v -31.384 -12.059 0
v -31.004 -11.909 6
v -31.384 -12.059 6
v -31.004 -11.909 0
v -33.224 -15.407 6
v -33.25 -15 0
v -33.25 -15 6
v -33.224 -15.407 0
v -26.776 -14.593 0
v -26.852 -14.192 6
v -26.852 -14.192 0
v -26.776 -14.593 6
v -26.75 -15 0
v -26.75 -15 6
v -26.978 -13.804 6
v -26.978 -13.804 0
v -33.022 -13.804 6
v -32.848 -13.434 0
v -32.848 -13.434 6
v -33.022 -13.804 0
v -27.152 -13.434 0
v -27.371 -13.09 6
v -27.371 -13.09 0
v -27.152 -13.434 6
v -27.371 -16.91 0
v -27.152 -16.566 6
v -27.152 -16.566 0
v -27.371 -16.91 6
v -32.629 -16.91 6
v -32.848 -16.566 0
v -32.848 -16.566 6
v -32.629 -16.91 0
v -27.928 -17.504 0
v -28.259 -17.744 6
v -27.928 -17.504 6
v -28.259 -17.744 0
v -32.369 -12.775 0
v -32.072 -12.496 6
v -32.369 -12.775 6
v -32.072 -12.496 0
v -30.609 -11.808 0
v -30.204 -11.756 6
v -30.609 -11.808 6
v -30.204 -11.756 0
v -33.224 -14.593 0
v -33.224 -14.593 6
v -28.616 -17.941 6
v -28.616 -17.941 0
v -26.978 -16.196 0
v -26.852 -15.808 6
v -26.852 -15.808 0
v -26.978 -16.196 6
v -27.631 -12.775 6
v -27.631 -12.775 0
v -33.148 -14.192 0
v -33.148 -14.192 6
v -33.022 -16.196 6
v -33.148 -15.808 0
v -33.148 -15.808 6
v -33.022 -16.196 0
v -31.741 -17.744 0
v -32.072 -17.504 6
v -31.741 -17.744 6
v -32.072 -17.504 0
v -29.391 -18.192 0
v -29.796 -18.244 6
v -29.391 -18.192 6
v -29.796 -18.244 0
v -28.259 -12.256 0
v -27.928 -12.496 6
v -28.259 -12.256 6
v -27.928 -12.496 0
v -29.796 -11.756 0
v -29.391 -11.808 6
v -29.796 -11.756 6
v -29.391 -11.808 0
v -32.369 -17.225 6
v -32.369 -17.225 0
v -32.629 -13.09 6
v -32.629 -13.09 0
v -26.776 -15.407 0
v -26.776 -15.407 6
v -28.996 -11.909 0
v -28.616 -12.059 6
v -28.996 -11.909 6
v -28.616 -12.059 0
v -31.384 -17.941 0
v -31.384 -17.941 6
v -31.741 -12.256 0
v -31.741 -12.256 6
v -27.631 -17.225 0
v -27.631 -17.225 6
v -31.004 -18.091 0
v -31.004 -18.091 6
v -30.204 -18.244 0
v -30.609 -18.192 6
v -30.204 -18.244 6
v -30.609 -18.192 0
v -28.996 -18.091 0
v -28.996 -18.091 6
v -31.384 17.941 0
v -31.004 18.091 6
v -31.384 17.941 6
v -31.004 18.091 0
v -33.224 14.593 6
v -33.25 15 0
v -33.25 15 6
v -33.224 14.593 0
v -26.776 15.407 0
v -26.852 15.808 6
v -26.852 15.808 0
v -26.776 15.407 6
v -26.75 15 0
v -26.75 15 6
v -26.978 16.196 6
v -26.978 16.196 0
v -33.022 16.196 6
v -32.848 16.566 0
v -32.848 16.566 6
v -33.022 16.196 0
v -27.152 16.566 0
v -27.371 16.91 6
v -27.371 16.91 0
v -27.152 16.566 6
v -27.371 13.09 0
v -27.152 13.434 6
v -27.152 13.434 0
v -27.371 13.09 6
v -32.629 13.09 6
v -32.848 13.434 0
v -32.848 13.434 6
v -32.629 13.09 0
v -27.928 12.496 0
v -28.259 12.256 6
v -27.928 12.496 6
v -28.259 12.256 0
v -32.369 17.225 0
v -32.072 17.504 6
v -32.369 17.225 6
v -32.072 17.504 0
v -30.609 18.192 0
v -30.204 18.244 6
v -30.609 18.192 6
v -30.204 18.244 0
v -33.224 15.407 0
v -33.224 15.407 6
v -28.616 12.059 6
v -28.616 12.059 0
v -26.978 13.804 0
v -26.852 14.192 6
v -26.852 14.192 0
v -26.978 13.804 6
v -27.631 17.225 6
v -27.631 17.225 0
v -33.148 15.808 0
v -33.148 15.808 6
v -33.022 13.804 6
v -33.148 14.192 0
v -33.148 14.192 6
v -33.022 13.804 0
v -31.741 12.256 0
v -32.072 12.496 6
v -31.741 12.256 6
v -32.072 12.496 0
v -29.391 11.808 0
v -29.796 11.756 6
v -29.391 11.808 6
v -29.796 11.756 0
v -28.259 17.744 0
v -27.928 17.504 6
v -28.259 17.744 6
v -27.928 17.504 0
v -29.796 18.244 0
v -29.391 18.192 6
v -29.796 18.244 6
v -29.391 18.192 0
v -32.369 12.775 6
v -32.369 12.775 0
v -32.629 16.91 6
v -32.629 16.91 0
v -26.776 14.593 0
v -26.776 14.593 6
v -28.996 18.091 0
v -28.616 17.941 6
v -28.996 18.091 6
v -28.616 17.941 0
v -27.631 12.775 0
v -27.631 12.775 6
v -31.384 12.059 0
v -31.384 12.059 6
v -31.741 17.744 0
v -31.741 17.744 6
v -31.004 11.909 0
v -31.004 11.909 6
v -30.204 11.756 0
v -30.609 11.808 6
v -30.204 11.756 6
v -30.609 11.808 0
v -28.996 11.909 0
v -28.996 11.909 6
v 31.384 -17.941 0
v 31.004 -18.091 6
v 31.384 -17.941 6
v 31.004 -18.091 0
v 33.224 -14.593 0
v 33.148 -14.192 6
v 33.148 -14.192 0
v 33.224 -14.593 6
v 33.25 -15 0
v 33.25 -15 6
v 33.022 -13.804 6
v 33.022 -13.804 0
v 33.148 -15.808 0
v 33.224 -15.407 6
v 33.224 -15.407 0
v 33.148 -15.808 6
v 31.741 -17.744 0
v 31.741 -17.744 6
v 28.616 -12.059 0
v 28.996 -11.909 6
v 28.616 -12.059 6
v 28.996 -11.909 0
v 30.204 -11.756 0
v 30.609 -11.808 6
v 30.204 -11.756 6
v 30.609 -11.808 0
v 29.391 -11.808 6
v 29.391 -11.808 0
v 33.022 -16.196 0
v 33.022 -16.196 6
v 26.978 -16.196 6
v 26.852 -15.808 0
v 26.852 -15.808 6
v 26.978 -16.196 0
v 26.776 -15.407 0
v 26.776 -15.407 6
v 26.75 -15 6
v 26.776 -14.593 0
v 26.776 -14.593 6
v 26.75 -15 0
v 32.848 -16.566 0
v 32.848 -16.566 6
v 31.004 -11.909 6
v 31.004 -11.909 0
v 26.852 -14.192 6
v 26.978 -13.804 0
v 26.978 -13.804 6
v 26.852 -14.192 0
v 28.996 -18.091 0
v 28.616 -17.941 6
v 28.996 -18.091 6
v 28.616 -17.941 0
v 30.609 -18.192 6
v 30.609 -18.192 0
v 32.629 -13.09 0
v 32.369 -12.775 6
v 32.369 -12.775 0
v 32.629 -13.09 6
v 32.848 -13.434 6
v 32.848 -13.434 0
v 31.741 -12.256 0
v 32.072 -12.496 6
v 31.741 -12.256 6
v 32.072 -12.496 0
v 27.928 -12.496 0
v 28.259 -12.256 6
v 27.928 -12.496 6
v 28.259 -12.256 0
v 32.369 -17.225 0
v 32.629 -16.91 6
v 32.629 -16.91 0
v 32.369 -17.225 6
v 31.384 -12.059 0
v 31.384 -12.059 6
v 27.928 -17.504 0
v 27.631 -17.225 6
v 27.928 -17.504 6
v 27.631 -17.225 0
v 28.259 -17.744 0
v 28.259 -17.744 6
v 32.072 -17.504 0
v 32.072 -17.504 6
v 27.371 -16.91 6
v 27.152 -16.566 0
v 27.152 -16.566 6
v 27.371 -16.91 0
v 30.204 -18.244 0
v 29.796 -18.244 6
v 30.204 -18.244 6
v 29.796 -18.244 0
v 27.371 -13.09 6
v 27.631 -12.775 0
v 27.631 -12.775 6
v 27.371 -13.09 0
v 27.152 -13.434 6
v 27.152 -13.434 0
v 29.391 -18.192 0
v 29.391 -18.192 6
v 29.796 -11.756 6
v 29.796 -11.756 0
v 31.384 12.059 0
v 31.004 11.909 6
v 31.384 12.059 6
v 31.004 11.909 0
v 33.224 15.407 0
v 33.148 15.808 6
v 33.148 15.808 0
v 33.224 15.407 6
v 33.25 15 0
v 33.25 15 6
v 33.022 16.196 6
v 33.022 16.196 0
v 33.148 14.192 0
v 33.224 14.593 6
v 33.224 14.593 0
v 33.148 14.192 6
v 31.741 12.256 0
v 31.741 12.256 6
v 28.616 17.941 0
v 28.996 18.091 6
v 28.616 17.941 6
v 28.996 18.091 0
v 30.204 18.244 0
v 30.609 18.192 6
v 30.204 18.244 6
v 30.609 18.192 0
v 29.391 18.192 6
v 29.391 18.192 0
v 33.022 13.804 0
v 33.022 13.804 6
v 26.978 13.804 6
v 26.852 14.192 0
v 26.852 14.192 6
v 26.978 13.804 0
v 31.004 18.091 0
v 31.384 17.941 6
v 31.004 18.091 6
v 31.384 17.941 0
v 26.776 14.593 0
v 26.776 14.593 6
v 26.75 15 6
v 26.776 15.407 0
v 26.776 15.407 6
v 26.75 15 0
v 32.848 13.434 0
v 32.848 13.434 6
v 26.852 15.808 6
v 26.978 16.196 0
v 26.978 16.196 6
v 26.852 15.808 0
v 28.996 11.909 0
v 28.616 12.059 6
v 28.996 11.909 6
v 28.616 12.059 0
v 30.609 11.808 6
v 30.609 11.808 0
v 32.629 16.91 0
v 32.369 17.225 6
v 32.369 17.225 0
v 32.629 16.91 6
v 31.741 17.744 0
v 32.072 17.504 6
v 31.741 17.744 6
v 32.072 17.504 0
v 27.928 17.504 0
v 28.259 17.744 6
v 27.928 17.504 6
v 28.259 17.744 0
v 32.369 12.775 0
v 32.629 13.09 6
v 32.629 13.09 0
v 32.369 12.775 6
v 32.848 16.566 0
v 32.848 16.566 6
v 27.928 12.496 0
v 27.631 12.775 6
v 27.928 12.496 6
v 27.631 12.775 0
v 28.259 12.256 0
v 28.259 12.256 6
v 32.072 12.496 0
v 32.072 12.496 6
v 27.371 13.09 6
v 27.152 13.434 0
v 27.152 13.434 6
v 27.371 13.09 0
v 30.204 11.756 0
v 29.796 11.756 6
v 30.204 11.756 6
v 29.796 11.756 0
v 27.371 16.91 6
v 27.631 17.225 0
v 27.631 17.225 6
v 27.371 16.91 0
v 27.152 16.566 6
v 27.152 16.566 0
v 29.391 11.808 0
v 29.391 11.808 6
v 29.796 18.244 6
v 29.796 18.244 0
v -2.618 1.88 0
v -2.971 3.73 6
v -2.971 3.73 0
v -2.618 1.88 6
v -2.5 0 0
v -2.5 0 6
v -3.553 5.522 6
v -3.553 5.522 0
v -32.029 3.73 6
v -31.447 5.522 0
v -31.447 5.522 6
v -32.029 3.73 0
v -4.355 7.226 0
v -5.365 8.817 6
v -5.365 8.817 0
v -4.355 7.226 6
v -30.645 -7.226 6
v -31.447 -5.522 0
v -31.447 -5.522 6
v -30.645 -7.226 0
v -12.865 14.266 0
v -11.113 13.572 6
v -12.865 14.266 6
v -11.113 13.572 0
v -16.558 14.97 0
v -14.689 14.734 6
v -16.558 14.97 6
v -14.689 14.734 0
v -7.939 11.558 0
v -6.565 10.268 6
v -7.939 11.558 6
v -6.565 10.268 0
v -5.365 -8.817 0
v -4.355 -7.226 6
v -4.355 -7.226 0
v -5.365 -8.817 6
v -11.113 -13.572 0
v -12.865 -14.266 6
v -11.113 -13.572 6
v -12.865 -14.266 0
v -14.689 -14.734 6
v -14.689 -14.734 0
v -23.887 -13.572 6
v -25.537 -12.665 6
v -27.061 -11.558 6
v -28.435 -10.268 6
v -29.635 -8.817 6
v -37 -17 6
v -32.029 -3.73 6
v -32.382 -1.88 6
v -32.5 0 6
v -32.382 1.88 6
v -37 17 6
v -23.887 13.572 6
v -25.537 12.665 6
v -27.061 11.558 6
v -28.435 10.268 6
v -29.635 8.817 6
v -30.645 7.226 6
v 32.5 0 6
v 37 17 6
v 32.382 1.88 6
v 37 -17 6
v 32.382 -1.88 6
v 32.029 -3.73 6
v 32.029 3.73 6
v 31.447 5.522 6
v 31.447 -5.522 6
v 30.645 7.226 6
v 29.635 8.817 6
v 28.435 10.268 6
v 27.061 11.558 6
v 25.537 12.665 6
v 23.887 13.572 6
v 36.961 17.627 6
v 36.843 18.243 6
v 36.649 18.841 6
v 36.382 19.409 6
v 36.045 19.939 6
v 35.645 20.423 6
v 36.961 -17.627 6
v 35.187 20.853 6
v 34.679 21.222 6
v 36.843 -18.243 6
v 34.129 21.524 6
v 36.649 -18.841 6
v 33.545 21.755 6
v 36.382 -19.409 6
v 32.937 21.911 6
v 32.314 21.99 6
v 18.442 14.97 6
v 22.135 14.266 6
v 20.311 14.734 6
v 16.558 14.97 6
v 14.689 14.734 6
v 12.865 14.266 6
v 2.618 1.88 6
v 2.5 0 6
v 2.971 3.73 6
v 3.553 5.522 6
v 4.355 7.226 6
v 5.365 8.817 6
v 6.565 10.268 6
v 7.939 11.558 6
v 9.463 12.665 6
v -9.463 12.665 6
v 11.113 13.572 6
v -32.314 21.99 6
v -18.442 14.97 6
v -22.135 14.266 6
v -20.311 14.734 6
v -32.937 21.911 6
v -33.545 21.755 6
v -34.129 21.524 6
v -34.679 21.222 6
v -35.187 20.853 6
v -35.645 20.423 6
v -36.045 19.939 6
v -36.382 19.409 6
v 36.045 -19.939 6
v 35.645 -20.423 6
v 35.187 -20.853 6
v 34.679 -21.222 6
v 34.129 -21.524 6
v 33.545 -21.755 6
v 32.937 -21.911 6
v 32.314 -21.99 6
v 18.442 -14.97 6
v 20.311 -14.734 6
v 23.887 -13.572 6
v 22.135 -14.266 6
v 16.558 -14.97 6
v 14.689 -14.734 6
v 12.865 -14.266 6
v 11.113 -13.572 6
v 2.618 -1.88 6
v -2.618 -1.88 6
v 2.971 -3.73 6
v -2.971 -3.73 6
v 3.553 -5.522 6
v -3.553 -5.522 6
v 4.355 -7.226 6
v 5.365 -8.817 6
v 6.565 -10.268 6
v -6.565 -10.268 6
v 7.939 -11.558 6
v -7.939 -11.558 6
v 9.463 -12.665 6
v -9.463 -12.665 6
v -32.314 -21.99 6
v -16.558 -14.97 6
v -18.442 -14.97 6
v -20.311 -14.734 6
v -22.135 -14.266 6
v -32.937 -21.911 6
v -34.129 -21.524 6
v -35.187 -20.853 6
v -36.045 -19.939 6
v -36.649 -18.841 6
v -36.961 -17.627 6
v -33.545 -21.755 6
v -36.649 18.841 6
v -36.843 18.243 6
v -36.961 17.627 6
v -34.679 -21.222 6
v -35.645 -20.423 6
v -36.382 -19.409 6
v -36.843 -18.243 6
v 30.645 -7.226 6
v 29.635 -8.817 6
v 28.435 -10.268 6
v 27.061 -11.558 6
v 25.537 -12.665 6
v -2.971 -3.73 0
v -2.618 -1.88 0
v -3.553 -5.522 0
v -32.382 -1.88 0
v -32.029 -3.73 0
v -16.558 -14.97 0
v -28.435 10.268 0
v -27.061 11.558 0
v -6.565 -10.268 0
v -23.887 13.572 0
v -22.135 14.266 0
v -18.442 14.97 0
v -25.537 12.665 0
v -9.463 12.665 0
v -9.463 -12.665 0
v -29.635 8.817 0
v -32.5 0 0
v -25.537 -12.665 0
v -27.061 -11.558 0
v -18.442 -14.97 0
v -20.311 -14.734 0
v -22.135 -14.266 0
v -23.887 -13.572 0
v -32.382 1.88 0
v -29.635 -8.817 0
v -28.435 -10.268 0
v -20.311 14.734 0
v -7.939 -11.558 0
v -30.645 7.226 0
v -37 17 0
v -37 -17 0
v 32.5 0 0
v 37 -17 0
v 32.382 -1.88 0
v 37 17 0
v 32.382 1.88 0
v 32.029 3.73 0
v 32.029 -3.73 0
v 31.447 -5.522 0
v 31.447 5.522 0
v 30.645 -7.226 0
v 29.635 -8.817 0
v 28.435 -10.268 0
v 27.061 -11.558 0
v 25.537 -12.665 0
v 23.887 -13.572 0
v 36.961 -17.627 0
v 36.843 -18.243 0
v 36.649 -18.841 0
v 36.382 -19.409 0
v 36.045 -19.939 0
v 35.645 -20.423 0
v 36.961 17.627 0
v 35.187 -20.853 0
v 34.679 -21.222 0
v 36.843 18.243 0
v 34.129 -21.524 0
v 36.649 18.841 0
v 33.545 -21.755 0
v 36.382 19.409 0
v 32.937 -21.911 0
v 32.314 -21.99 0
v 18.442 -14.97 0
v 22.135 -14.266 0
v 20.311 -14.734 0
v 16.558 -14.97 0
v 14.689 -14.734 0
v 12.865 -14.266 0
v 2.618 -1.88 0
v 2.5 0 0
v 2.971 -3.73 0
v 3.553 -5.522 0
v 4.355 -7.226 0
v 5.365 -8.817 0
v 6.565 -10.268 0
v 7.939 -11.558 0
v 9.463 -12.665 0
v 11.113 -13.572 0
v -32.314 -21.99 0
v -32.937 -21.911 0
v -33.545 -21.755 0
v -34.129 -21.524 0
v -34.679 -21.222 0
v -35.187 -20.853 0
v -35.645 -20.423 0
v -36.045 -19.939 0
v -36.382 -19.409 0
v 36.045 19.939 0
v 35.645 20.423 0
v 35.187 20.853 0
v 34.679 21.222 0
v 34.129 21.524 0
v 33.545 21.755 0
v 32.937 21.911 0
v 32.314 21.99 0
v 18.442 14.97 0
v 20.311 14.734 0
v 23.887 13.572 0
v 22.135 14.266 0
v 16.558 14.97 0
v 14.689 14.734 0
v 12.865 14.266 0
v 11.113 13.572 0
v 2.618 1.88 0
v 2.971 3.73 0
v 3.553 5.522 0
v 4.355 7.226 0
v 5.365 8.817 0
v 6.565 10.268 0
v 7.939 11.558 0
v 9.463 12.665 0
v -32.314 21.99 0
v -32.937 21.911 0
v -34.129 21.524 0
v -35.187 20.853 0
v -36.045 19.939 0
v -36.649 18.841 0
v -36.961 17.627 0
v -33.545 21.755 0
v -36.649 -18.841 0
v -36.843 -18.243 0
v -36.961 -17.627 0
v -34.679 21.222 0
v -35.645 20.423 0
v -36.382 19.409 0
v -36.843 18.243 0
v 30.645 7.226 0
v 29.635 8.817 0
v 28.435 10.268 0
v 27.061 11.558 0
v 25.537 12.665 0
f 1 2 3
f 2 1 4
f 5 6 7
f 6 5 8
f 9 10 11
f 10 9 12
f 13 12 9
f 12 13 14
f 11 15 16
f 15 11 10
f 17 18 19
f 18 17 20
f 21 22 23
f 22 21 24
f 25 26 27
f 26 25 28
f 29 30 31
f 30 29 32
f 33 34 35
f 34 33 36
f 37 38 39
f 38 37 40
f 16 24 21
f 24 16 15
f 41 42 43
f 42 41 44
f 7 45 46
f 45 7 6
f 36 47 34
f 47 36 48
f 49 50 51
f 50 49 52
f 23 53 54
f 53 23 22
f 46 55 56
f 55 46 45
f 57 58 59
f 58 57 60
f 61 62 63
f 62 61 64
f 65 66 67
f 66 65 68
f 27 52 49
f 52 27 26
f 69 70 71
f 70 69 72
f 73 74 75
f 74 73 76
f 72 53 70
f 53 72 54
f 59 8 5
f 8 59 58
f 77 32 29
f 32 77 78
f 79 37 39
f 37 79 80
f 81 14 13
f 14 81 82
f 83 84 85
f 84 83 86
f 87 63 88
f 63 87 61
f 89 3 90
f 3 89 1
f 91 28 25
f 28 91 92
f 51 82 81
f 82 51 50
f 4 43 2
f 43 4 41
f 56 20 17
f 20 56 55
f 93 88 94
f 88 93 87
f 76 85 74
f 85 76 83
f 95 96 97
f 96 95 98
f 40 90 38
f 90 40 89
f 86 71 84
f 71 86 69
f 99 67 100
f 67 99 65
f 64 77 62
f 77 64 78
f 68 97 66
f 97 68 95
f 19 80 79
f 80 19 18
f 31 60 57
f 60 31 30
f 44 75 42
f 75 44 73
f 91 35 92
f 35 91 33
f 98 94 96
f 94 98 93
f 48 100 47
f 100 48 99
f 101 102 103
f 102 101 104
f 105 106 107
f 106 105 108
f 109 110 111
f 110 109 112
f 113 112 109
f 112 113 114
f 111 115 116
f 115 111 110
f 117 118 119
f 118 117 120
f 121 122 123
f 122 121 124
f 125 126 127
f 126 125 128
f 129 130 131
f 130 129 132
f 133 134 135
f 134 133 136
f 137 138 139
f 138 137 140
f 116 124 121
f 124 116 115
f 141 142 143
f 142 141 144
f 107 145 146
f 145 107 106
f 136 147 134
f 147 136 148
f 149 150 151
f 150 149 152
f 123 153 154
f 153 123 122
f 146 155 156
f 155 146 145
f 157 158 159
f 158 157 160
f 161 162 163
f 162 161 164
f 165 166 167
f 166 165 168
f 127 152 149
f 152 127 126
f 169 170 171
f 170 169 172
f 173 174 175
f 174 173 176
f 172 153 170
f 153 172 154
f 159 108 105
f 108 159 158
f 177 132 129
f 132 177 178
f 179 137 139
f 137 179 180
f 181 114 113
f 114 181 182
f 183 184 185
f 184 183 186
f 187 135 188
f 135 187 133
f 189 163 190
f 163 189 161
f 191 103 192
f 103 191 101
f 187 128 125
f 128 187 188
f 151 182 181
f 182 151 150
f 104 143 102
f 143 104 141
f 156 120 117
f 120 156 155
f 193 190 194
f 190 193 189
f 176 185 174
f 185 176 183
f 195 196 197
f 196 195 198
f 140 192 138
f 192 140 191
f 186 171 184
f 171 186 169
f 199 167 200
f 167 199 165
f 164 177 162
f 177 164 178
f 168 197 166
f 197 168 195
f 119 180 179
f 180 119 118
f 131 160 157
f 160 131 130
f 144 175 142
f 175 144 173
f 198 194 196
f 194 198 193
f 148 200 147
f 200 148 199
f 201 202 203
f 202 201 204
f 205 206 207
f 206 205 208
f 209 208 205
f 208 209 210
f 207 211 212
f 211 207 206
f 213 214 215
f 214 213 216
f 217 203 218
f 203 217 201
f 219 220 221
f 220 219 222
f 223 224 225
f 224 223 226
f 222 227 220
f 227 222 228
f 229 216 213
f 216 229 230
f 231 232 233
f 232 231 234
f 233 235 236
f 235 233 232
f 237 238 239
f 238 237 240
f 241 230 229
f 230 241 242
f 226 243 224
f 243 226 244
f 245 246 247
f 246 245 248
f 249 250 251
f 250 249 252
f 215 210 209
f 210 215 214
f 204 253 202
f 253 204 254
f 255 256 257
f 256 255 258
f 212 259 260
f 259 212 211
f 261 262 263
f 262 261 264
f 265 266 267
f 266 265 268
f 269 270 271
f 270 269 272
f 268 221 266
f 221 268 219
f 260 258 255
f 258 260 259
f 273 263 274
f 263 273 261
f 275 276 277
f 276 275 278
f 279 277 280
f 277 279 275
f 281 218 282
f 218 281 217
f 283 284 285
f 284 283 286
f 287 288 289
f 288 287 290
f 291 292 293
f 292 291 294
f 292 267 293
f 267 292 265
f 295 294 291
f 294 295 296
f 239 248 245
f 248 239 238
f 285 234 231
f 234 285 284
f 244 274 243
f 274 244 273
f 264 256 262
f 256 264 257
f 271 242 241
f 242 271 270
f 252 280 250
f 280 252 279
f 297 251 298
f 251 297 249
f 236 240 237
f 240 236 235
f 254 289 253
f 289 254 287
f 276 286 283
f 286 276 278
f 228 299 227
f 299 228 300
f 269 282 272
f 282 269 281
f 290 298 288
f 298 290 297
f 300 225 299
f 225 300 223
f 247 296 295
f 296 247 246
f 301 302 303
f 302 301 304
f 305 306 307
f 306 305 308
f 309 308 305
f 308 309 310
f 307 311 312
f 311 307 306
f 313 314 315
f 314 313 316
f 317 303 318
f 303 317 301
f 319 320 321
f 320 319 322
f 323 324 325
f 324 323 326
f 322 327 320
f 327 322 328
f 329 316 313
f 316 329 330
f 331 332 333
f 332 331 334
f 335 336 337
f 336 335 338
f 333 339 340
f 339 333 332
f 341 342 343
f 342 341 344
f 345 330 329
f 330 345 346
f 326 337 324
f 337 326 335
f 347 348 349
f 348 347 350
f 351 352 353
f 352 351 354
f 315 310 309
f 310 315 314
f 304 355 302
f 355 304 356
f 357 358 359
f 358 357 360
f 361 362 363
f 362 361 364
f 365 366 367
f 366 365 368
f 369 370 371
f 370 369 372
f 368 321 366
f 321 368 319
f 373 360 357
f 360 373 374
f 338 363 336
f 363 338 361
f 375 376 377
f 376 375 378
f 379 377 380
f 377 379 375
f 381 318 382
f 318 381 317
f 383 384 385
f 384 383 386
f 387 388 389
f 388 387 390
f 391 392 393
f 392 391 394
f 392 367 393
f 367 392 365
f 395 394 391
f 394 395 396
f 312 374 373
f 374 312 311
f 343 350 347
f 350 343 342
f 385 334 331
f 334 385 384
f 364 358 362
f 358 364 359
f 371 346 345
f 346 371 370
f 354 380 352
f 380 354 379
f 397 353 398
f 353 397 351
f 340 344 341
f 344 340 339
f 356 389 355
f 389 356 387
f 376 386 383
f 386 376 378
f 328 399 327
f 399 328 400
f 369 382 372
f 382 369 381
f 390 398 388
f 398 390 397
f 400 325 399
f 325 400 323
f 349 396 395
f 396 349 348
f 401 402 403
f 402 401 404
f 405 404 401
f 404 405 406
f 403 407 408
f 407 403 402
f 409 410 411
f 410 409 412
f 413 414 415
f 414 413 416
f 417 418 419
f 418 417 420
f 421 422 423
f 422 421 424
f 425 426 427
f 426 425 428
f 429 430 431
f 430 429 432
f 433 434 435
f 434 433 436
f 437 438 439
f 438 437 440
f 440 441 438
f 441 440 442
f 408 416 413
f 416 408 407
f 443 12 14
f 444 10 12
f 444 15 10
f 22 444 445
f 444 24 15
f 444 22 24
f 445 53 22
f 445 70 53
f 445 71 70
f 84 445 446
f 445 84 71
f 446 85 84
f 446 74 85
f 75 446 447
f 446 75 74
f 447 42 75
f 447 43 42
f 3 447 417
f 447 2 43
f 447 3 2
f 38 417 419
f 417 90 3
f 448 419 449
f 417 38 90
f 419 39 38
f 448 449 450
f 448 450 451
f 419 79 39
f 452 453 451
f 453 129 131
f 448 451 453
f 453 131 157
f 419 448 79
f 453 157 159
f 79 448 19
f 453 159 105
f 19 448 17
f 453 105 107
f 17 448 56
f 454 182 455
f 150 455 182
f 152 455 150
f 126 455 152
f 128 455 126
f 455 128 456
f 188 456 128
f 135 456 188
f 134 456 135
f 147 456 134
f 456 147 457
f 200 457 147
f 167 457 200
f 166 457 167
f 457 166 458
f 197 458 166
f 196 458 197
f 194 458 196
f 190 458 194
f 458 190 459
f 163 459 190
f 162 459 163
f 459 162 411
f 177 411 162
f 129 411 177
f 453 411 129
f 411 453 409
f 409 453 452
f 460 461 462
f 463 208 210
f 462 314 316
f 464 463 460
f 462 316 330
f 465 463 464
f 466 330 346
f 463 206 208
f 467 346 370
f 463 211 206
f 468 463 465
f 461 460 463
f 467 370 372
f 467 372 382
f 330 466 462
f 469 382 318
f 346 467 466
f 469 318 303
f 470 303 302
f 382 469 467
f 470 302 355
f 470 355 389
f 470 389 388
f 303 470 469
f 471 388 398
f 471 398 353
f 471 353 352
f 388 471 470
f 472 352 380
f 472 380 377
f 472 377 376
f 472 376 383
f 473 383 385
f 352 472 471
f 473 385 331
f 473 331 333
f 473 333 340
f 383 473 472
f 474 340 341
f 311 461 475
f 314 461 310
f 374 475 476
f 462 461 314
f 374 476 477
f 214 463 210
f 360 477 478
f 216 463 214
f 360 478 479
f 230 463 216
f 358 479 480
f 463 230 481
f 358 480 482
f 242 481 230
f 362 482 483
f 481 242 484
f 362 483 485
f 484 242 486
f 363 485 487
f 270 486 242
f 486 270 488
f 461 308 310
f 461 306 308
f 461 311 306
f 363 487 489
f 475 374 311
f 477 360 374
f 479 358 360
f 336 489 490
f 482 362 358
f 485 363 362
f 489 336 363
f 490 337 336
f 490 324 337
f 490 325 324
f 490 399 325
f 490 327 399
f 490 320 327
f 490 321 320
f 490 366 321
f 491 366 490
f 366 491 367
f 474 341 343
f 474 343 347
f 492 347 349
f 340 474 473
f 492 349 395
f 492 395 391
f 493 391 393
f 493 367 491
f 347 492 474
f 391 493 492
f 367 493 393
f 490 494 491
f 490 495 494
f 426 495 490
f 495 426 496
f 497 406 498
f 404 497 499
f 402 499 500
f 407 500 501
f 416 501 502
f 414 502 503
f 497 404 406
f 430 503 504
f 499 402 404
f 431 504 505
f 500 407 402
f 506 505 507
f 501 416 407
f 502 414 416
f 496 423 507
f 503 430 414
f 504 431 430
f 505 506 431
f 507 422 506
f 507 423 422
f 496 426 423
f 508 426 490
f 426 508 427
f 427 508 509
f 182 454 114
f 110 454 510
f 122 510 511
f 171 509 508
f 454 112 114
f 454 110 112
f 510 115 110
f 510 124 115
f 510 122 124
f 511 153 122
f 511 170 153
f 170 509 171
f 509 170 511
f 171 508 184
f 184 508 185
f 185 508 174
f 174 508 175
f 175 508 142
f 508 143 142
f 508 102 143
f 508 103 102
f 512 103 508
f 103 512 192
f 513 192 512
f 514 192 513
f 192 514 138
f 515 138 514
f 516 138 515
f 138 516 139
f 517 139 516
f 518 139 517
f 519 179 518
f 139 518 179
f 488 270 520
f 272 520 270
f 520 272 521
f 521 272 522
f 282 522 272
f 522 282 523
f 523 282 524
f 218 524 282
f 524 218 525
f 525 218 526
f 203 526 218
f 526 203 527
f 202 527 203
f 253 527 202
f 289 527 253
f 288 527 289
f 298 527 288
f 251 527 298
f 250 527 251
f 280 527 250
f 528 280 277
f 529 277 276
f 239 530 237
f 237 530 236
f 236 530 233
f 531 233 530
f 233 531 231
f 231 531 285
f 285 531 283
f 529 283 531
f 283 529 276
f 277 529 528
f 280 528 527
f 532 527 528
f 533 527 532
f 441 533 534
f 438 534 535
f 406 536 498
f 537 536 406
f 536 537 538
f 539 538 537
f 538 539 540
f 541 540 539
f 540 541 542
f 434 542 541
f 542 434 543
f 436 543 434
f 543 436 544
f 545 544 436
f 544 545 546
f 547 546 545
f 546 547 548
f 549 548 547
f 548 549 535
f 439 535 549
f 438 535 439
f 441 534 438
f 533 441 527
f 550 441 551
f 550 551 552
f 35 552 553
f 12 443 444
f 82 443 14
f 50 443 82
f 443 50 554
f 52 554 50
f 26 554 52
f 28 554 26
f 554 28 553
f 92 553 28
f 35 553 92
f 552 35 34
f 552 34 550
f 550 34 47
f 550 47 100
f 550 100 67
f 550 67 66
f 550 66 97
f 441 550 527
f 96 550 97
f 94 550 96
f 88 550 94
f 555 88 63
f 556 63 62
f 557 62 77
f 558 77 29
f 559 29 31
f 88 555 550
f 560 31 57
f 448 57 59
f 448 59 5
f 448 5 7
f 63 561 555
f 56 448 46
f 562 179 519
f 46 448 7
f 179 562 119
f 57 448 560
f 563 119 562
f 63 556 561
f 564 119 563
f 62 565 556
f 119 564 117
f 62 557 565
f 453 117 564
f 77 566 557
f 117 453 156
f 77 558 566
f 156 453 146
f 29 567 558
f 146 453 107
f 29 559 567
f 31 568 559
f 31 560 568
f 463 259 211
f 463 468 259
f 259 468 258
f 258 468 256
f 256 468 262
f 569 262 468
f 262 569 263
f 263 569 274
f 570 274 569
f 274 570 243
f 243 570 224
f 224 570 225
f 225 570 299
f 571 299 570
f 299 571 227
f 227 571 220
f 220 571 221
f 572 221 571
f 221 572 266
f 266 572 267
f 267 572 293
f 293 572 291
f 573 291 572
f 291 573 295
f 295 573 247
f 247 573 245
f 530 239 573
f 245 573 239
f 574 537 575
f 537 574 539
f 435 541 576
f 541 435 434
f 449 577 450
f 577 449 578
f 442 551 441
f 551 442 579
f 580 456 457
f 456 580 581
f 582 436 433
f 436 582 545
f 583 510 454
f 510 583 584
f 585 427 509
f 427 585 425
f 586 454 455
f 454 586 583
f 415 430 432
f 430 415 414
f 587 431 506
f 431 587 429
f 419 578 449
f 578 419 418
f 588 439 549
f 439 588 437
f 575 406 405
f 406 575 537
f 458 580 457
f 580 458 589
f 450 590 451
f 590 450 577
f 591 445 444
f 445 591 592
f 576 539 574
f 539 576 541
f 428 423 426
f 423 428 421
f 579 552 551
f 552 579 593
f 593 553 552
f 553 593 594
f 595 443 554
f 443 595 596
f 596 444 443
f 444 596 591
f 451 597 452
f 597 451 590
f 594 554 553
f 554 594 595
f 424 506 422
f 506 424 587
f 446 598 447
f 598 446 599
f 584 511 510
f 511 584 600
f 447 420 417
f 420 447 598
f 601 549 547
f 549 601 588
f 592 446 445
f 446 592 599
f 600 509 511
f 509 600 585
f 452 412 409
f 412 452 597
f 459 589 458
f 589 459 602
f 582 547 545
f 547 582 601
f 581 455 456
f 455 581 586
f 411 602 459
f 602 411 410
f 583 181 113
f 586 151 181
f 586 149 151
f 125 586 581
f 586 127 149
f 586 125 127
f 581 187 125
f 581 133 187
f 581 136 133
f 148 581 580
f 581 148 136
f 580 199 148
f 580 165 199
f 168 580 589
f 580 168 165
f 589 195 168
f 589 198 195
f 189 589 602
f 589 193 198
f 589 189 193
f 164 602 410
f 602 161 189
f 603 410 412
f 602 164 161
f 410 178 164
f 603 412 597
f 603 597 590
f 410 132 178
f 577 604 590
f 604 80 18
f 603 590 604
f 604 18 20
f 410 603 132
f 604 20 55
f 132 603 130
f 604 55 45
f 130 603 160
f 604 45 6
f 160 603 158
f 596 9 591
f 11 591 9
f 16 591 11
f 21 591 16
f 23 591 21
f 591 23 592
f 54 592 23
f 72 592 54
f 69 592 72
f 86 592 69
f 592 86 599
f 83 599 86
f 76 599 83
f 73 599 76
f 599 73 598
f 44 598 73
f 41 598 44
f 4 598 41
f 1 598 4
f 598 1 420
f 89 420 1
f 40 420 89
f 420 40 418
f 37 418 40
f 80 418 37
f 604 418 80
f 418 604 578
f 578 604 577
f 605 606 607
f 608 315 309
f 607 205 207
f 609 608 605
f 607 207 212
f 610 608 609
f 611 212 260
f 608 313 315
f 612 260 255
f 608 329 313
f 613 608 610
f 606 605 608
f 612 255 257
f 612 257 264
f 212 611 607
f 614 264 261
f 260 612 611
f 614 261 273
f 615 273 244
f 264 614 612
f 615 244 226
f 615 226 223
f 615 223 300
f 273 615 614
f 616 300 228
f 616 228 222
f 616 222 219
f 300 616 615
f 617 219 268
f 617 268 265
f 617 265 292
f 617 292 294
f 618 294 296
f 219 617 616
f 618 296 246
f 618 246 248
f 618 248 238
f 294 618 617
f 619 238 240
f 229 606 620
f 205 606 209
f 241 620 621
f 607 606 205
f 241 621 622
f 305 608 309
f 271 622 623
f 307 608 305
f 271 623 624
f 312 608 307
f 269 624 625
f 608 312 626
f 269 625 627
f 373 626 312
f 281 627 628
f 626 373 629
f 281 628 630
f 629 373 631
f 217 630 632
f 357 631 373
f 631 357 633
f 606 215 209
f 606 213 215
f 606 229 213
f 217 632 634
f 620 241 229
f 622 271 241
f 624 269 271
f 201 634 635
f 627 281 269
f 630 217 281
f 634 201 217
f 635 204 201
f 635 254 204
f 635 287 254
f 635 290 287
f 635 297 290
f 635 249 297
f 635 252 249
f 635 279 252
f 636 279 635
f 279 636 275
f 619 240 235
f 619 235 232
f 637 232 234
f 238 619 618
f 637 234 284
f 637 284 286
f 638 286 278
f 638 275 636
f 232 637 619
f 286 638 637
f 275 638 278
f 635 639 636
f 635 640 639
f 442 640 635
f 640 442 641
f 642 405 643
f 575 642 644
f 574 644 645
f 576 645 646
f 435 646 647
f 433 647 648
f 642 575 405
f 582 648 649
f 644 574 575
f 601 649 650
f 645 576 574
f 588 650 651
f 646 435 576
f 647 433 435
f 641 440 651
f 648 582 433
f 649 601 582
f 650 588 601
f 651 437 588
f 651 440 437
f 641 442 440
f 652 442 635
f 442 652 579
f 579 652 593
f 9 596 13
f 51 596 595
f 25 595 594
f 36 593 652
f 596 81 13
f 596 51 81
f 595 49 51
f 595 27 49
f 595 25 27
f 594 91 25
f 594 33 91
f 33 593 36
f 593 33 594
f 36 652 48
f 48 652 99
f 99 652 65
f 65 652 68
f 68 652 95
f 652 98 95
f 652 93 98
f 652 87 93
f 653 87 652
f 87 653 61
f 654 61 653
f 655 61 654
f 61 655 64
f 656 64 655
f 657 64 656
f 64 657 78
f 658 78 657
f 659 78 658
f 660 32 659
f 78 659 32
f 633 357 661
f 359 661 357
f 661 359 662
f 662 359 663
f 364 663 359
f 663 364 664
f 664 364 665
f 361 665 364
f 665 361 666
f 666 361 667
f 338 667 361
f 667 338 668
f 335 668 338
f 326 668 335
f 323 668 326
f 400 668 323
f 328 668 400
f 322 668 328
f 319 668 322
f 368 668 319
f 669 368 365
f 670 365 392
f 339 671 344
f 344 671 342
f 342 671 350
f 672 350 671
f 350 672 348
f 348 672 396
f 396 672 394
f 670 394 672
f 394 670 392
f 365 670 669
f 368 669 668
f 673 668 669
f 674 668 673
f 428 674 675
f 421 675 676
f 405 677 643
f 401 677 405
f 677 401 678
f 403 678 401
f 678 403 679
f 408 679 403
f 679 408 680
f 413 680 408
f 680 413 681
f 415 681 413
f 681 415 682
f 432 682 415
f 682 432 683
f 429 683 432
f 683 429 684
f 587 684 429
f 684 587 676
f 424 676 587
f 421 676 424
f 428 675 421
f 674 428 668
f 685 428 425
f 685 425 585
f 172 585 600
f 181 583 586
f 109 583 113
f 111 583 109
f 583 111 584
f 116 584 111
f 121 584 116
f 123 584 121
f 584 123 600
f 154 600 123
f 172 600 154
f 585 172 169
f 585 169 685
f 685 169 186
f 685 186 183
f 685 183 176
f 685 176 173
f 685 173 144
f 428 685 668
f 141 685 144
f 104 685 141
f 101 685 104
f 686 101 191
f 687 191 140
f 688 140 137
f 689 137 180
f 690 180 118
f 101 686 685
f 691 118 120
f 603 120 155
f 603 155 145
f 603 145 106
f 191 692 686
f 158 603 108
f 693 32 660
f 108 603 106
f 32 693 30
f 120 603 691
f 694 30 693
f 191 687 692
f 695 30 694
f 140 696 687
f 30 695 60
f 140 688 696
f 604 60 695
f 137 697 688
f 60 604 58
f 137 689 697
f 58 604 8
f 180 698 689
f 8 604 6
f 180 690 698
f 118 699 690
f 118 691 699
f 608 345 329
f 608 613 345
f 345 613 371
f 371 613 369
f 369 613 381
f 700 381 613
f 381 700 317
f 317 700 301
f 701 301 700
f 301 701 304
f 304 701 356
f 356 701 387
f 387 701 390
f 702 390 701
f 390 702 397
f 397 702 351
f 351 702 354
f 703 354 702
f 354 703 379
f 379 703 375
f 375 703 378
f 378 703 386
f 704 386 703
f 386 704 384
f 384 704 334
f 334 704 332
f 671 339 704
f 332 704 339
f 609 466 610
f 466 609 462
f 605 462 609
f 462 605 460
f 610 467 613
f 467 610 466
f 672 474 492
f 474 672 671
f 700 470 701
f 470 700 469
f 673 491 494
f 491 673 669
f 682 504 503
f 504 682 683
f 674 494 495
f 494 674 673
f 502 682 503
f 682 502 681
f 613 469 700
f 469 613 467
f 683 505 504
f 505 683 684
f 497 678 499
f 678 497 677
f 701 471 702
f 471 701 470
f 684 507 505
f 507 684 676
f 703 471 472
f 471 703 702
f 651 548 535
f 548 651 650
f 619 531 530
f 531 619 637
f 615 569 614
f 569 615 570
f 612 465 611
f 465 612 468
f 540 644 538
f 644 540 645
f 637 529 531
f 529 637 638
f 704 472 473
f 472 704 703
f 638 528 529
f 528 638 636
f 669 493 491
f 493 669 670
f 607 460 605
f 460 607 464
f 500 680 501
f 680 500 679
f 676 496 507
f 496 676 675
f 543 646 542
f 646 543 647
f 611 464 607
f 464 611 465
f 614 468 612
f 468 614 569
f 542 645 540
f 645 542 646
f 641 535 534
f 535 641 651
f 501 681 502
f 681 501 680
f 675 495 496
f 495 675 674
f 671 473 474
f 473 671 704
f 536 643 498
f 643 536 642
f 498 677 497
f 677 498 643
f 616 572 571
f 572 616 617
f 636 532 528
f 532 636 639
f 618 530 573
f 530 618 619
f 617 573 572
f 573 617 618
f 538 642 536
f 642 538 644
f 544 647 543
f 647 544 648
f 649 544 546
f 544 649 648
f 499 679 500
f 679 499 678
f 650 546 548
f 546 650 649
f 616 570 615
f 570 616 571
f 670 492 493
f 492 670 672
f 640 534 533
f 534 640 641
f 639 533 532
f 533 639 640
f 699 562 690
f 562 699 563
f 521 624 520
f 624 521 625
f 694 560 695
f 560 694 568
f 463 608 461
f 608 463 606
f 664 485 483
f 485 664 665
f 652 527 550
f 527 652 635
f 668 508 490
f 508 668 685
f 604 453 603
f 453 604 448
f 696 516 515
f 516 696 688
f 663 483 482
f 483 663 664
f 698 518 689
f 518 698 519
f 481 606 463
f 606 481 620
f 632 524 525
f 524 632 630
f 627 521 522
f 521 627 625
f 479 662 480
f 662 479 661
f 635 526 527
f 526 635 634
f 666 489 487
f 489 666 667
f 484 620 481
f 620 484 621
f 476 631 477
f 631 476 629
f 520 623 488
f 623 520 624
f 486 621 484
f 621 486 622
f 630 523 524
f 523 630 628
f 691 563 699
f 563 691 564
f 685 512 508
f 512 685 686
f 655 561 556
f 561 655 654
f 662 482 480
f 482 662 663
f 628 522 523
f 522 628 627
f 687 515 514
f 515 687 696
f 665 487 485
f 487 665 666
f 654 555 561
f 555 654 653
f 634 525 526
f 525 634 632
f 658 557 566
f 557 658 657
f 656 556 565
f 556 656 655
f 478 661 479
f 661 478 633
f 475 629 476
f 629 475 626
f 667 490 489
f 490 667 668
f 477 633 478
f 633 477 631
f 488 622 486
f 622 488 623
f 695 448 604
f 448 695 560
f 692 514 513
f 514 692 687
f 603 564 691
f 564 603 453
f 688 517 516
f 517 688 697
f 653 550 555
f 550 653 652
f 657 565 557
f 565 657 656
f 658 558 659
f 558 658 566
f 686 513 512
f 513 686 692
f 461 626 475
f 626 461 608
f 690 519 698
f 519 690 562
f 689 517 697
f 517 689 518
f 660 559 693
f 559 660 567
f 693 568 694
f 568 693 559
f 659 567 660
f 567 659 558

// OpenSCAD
$fn = 50;


difference() {
	union() {
		hull() {
			translate(v = [-32.0000000000, 17.0000000000, 0]) {
				cylinder(h = 6, r = 5);
			}
			translate(v = [32.0000000000, 17.0000000000, 0]) {
				cylinder(h = 6, r = 5);
			}
			translate(v = [-32.0000000000, -17.0000000000, 0]) {
				cylinder(h = 6, r = 5);
			}
			translate(v = [32.0000000000, -17.0000000000, 0]) {
				cylinder(h = 6, r = 5);
			}
		}
	}
	union() {
		#translate(v = [-30.0000000000, -15.0000000000, -100.0000000000]) {
			cylinder(h = 200, r = 3.2500000000);
		}
		#translate(v = [-30.0000000000, 15.0000000000, -100.0000000000]) {
			cylinder(h = 200, r = 3.2500000000);
		}
		#translate(v = [30.0000000000, -15.0000000000, -100.0000000000]) {
			cylinder(h = 200, r = 3.2500000000);
		}
		#translate(v = [30.0000000000, 15.0000000000, -100.0000000000]) {
			cylinder(h = 200, r = 3.2500000000);
		}
		#translate(v = [-17.5000000000, 0, 0]) {
			cylinder(h = 6, r = 15.0000000000);
		}
		#translate(v = [17.5000000000, 0, 0]) {
			cylinder(h = 6, r = 15.0000000000);
		}
	}
}
